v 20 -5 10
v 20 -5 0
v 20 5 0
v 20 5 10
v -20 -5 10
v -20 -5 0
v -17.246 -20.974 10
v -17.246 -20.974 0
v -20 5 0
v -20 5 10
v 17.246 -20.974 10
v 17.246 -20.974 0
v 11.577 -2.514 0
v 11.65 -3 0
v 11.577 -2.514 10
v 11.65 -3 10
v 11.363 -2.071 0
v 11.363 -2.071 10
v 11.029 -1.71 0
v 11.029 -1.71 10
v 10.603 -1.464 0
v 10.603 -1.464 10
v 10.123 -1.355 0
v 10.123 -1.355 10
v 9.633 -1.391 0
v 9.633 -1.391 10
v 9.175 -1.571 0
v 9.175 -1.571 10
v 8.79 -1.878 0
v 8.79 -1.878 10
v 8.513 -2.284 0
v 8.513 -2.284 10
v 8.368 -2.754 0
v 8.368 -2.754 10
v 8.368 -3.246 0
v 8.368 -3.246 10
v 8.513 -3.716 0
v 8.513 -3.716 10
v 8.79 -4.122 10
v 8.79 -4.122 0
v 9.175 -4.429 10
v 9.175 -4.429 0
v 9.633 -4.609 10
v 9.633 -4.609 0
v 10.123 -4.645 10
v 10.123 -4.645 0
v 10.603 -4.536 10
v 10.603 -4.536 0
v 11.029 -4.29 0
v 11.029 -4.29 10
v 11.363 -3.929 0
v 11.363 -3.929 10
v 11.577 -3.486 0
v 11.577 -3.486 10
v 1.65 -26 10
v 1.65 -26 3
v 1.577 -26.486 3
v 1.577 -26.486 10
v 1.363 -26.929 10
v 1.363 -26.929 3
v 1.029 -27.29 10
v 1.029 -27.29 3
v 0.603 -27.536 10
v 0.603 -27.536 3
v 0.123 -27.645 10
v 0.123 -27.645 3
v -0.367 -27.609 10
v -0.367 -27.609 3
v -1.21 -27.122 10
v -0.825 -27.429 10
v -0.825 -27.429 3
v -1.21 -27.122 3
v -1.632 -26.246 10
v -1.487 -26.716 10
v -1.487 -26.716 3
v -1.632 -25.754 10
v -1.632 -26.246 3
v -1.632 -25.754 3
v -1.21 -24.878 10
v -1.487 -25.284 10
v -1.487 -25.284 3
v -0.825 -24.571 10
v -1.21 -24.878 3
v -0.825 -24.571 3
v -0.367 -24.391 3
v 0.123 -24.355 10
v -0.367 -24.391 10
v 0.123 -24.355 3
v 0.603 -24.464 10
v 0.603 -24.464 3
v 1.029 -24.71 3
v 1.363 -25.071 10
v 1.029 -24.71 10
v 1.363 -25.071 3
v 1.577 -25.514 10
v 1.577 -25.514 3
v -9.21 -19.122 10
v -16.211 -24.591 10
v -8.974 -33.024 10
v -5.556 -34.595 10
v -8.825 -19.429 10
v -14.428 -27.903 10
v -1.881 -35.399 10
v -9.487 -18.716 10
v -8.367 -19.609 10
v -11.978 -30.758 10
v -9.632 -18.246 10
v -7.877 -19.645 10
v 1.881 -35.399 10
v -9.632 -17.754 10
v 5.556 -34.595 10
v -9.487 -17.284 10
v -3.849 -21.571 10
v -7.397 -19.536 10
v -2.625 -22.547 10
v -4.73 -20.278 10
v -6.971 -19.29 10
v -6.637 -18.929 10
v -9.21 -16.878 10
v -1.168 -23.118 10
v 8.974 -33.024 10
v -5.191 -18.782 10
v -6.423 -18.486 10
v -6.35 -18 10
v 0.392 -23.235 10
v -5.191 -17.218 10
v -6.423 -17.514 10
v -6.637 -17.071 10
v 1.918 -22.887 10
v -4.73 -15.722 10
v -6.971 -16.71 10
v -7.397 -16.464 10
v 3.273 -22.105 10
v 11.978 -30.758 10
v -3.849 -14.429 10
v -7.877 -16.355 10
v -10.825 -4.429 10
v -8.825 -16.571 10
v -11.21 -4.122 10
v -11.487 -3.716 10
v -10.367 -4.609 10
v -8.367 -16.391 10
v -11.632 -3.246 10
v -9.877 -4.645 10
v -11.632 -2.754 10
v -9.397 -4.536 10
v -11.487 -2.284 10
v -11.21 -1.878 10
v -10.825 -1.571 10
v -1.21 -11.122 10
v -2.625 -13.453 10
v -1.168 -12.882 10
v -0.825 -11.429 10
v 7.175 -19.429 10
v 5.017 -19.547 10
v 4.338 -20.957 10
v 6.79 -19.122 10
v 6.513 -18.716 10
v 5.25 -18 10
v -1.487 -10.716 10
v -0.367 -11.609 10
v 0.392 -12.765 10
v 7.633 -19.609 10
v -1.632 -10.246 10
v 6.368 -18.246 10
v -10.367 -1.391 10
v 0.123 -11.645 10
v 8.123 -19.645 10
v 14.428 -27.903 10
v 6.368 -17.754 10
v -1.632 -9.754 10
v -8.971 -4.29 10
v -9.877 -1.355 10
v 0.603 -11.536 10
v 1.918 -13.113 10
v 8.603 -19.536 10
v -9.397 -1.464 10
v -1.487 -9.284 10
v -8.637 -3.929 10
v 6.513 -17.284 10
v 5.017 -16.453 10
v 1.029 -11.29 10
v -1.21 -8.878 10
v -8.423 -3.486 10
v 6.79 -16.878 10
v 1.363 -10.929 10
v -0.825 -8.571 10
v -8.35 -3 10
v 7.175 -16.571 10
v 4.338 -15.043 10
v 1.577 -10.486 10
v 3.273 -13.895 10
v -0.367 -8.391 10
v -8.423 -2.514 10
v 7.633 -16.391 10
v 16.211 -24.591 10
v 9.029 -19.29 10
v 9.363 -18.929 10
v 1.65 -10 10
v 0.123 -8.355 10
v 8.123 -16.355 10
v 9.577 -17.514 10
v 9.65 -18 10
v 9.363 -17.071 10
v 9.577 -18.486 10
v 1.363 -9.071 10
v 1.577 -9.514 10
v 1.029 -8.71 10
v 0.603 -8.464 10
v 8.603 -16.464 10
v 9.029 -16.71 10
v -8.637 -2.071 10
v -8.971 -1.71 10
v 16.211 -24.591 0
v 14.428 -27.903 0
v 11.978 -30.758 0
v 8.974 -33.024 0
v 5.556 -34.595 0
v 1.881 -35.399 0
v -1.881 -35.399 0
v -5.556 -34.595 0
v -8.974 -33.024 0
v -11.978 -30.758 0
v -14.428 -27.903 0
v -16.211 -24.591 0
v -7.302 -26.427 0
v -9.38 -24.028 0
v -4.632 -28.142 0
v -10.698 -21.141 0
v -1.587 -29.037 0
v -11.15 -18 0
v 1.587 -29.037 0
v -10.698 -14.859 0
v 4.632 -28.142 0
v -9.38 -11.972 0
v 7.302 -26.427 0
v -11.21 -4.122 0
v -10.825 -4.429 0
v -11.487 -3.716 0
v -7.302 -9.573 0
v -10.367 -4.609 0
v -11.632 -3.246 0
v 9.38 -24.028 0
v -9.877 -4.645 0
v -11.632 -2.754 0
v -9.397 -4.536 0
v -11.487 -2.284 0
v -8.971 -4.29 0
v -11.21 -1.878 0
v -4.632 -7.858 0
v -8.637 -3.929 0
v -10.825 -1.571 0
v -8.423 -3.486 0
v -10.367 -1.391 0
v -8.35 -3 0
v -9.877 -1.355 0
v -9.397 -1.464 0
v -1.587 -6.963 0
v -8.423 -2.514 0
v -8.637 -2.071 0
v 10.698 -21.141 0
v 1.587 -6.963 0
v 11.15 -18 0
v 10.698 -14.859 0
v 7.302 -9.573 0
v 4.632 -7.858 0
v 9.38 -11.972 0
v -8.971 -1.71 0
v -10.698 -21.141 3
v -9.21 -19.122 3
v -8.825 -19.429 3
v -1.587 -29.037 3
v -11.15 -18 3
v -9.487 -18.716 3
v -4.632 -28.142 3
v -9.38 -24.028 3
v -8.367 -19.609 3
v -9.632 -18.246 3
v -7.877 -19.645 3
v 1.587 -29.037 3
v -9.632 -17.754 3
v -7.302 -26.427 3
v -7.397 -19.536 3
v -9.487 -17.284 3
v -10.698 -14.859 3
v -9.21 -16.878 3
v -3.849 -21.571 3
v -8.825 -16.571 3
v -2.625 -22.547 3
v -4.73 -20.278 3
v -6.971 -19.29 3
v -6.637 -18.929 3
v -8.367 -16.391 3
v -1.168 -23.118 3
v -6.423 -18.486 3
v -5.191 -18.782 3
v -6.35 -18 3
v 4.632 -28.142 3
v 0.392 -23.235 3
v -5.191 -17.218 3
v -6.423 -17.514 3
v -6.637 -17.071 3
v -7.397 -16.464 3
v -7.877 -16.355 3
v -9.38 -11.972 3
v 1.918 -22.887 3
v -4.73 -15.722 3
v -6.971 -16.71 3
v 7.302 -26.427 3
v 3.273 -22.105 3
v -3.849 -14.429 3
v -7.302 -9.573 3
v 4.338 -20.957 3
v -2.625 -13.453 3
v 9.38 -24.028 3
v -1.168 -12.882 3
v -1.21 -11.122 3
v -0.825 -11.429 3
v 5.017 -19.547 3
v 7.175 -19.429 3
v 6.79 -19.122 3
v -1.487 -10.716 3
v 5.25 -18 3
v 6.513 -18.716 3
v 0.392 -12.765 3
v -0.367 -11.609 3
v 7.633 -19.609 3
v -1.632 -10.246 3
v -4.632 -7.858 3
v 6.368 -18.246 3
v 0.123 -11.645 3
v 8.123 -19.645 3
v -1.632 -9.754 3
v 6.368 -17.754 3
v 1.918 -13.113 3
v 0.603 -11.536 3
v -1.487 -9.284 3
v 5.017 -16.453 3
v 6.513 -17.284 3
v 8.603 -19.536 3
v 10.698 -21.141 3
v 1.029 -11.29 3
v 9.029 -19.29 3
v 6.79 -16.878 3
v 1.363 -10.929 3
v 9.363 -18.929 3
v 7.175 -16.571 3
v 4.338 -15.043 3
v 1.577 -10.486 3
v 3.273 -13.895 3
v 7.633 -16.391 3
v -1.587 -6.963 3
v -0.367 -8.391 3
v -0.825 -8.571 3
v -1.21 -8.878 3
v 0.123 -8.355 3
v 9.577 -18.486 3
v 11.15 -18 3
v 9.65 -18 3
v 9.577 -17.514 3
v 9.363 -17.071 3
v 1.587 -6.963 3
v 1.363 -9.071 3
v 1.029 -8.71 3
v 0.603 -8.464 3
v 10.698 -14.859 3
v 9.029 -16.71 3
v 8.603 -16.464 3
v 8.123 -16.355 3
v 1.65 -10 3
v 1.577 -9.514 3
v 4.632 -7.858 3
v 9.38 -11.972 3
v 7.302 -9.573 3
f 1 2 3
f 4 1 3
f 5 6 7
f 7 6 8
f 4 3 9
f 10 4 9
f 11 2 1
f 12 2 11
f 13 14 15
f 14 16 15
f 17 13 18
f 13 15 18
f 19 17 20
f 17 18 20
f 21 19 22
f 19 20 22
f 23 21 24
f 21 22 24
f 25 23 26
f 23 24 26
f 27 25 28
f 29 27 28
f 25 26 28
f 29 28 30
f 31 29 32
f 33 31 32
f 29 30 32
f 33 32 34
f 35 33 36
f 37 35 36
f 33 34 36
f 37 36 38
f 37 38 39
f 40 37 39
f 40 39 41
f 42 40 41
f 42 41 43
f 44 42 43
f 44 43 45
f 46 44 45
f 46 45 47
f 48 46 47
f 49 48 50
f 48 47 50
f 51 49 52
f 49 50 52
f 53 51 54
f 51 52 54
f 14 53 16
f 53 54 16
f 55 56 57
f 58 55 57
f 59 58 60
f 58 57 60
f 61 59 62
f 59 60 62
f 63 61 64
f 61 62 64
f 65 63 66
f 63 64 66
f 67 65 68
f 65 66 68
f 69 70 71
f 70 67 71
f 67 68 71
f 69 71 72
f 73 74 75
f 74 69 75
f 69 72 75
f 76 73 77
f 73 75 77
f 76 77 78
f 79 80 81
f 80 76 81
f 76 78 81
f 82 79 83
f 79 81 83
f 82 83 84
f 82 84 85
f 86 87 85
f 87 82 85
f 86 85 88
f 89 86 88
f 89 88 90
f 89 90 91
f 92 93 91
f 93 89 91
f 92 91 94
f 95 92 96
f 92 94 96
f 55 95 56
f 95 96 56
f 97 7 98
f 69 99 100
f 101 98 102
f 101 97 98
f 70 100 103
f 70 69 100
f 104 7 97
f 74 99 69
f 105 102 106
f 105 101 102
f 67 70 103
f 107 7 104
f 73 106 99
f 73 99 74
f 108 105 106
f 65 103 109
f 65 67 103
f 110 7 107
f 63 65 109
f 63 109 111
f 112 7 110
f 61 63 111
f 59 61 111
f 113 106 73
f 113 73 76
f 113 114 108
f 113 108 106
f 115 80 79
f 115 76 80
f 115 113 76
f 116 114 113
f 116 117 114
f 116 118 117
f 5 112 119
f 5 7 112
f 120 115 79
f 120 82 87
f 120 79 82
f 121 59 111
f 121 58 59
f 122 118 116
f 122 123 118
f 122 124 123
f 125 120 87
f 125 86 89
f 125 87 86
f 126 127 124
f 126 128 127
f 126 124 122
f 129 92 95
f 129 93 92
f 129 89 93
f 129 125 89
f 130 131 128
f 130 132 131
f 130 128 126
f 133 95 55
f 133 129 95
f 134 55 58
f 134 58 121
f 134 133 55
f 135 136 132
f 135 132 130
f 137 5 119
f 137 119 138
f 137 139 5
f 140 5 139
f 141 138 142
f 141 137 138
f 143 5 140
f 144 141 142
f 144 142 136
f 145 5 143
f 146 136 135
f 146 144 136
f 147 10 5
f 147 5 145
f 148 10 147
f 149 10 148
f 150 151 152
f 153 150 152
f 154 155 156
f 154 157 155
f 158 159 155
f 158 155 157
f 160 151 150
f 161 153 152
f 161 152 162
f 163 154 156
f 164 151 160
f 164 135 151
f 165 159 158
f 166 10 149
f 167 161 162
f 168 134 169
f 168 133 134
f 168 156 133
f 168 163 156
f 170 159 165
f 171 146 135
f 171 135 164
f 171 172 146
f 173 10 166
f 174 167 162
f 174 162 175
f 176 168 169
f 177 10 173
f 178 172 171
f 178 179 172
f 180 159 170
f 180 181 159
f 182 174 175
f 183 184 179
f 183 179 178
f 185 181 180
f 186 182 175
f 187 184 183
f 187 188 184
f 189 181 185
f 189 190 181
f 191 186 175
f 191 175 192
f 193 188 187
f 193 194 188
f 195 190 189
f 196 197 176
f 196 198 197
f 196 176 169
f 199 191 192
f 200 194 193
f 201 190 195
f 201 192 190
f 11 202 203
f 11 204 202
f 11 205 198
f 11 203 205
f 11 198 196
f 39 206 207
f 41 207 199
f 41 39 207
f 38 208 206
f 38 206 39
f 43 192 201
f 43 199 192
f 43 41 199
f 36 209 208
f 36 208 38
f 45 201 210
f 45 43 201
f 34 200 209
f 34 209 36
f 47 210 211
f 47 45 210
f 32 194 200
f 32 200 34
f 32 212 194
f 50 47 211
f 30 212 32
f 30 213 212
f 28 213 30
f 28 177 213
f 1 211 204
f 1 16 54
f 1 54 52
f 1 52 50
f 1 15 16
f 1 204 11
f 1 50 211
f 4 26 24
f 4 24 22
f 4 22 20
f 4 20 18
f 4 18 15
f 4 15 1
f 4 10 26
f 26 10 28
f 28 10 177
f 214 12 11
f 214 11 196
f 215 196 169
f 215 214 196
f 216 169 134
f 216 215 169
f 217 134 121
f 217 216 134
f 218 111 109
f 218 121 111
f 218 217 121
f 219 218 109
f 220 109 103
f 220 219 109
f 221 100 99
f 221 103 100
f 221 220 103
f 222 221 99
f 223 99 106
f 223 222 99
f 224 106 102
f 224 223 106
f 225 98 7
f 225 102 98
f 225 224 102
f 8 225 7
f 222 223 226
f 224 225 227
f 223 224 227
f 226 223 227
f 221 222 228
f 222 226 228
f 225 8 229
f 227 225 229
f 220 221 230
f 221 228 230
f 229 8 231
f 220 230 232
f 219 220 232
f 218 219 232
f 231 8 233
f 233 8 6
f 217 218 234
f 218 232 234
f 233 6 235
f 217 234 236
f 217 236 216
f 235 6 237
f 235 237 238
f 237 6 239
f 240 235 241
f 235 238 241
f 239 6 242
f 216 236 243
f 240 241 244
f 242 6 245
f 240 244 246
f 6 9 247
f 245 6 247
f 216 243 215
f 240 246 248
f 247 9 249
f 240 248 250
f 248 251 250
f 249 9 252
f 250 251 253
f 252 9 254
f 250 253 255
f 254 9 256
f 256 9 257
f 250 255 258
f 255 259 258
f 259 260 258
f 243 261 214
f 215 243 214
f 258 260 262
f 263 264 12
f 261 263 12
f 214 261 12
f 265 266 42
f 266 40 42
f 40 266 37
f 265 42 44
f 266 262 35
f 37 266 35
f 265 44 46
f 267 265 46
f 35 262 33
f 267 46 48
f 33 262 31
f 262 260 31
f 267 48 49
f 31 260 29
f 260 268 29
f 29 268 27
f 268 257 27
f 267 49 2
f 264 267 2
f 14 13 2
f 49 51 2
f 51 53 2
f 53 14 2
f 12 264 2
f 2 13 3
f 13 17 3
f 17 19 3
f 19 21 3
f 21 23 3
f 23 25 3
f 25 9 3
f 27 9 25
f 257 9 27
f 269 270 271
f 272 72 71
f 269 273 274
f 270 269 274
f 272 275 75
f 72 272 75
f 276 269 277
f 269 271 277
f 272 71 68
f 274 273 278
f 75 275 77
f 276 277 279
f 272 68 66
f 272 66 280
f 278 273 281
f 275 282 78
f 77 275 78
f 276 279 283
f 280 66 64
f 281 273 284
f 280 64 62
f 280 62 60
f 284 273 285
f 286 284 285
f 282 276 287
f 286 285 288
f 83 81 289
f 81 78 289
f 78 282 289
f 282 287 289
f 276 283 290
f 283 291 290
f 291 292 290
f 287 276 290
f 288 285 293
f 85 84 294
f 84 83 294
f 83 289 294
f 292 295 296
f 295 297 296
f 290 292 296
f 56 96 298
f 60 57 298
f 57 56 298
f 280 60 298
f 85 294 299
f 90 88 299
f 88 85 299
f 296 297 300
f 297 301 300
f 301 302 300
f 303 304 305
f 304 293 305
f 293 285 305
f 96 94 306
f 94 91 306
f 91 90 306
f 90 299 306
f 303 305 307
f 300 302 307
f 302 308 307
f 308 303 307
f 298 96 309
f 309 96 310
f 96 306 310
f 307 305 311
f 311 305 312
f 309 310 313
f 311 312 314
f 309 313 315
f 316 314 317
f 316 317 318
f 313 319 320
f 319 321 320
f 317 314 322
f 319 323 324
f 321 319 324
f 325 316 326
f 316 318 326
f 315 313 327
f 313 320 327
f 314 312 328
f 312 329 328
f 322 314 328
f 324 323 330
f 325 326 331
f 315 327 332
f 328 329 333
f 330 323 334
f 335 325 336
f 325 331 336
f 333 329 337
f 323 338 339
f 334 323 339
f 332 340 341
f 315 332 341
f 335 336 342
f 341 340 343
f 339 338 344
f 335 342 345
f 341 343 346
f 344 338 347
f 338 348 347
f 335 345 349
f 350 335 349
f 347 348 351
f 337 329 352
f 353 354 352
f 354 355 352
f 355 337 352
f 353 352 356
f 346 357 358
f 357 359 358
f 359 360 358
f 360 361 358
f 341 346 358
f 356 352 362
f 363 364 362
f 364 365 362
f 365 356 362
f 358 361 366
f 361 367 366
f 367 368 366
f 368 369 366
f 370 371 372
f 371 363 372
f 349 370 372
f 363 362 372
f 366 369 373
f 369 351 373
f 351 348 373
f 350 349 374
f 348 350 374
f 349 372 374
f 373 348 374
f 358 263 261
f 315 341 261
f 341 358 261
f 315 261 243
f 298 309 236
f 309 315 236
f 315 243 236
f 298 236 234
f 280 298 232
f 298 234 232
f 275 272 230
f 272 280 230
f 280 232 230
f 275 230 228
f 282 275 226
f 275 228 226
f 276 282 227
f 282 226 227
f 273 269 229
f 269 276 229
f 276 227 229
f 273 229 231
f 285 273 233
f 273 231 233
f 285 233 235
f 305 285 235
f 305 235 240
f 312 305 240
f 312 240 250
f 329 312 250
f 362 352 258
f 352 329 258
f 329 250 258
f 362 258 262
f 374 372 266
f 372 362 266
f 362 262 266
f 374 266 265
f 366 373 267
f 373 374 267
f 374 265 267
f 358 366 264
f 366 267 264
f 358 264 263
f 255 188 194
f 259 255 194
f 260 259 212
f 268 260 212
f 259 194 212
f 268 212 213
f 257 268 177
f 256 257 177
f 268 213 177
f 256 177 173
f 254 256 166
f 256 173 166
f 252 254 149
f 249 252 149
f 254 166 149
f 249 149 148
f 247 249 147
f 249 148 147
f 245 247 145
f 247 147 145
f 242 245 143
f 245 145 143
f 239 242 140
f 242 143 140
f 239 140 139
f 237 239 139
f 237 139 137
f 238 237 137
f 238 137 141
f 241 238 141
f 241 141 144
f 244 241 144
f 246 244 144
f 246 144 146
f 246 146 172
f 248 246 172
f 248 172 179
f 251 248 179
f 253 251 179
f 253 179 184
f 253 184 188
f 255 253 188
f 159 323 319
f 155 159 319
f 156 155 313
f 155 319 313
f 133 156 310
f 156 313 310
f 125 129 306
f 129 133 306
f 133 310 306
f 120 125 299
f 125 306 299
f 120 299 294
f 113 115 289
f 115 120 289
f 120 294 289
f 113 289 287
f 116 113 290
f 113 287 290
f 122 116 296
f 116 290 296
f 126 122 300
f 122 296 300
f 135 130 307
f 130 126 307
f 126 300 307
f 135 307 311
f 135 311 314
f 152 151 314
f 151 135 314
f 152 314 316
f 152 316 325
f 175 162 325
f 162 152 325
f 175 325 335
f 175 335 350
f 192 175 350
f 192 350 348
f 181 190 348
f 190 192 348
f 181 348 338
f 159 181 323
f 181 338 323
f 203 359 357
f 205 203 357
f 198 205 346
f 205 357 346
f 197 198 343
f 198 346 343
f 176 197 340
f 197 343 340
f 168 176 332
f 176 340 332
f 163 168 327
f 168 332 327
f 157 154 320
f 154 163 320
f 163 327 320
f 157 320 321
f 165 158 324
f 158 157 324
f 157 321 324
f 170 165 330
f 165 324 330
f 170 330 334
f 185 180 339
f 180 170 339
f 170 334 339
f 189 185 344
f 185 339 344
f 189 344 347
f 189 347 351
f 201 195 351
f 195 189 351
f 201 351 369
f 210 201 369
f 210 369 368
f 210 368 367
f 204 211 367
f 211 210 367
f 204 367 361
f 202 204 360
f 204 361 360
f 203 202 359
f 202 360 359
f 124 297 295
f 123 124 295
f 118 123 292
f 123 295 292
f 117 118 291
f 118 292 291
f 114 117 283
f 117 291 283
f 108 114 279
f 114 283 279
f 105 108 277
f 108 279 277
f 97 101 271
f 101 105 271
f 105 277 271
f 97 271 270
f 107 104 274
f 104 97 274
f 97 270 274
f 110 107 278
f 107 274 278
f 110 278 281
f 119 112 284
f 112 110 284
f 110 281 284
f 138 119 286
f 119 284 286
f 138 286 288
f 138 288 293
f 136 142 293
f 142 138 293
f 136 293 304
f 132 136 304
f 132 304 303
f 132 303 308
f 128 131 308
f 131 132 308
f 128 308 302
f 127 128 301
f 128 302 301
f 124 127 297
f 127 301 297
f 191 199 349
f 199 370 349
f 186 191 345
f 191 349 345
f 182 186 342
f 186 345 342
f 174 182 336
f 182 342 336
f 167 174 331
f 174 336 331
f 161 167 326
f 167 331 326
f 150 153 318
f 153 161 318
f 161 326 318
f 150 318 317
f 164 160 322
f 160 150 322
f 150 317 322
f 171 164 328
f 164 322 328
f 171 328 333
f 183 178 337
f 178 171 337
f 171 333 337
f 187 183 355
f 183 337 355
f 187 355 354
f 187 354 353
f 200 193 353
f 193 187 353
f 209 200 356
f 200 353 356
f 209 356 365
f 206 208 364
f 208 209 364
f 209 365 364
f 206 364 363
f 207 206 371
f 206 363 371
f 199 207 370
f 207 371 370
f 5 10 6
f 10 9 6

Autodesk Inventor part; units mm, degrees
ref_plane "YZ Plane" through (0, 0, 0) normal (1, 0, 0) x (0, 1, 0)
ref_plane "XZ Plane" through (0, 0, 0) normal (0, 1, 0) x (-1, 0, 0)
ref_plane "XY Plane" through (0, 0, 0) normal (0, 0, 1) x (1, 0, 0)
sketch "Sketch1" plane through (0, 0, 0) normal (0, 0, 1) x (1, 0, 0)
  line L0 (-20, -5) -> (20, -5)
  line L1 (20, -5) -> (20, 5)
  line L2 (20, 5) -> (-20, 5)
  line L3 (-20, 5) -> (-20, -5)
  line L4 (-20, -5) -> (20, 5) construction
  line L5 (20, -5) -> (-20, 5) construction
  circle A0 centre (0, -18) radius 11.15
  circle A1 centre (0, -18) radius 5.25
  circle A2 centre (0, -18) radius 17.5
  line L6 (-20, -5) -> (-17.2455, -20.9738)
  line L7 (20, -5) -> (17.2455, -20.9738)
  circle A3 centre (0, -10) radius 1.65
  circle A4 centre (-8, -18) radius 1.65
  circle A5 centre (0, -26) radius 1.65
  circle A6 centre (8, -18) radius 1.65
  point P0 (0, 0)
  dimension "d0" = 22.3
  dimension "d1" = 10.5
  dimension "d2" = 35
  dimension "d3" = 3.3
  dimension "d4" = 8
  dimension "d7" = 360
  dimension "d14" = 40
  dimension "d16" = 23
  dimension "d17" = 10
extrude "Extrusion1" add sketch "Sketch1" along normal blind 10 contours L3 L2 L1 L0 A2 | L0 A2 L6 | A2 L0 | L0 A2 | L0 L7 A2 | A0
extrude "Extrusion2" cut sketch "Sketch1" along normal blind 3 contours A0
sketch "Sketch2" plane through (0, 0, 10) normal (0, 0, 1) x (1, 0, 0)
  line L0 (20, 5) -> (-20, 5) projected
  line L1 (-20, 5) -> (-20, -5) projected
  line L2 (-20, -5) -> (-17.2455, -20.9738) projected
  arc A0 (-17.2455, -20.9738) -> (17.2455, -20.9738) centre (0, -18) ccw projected
  line L3 (17.2455, -20.9738) -> (20, -5) projected
  line L4 (20, -5) -> (20, 5) projected
  circle A1 centre (0, -18) radius 5.25 projected
  circle A2 centre (0, -10) radius 1.65 projected
  circle A3 centre (-8, -18) radius 1.65 projected
  circle A4 centre (0, -26) radius 1.65 projected
  circle A5 centre (8, -18) radius 1.65 projected
  circle A6 centre (-10, -3) radius 1.65
  circle A7 centre (10, -3) radius 1.65
  line L5 (-10, -3) -> (10, -3)
  point P0 (0, 0)
  point P1 (0, -3)
  dimension "d18" = 3.3
  dimension "d19" = 3.3
  dimension "d20" = 8
  dimension "d21" = 20
extrude "Extrusion3" cut sketch "Sketch2" against normal through all contours A6 | A7
properties part number "PARA_TUERCA" material "Steel, Mild, Welded"
